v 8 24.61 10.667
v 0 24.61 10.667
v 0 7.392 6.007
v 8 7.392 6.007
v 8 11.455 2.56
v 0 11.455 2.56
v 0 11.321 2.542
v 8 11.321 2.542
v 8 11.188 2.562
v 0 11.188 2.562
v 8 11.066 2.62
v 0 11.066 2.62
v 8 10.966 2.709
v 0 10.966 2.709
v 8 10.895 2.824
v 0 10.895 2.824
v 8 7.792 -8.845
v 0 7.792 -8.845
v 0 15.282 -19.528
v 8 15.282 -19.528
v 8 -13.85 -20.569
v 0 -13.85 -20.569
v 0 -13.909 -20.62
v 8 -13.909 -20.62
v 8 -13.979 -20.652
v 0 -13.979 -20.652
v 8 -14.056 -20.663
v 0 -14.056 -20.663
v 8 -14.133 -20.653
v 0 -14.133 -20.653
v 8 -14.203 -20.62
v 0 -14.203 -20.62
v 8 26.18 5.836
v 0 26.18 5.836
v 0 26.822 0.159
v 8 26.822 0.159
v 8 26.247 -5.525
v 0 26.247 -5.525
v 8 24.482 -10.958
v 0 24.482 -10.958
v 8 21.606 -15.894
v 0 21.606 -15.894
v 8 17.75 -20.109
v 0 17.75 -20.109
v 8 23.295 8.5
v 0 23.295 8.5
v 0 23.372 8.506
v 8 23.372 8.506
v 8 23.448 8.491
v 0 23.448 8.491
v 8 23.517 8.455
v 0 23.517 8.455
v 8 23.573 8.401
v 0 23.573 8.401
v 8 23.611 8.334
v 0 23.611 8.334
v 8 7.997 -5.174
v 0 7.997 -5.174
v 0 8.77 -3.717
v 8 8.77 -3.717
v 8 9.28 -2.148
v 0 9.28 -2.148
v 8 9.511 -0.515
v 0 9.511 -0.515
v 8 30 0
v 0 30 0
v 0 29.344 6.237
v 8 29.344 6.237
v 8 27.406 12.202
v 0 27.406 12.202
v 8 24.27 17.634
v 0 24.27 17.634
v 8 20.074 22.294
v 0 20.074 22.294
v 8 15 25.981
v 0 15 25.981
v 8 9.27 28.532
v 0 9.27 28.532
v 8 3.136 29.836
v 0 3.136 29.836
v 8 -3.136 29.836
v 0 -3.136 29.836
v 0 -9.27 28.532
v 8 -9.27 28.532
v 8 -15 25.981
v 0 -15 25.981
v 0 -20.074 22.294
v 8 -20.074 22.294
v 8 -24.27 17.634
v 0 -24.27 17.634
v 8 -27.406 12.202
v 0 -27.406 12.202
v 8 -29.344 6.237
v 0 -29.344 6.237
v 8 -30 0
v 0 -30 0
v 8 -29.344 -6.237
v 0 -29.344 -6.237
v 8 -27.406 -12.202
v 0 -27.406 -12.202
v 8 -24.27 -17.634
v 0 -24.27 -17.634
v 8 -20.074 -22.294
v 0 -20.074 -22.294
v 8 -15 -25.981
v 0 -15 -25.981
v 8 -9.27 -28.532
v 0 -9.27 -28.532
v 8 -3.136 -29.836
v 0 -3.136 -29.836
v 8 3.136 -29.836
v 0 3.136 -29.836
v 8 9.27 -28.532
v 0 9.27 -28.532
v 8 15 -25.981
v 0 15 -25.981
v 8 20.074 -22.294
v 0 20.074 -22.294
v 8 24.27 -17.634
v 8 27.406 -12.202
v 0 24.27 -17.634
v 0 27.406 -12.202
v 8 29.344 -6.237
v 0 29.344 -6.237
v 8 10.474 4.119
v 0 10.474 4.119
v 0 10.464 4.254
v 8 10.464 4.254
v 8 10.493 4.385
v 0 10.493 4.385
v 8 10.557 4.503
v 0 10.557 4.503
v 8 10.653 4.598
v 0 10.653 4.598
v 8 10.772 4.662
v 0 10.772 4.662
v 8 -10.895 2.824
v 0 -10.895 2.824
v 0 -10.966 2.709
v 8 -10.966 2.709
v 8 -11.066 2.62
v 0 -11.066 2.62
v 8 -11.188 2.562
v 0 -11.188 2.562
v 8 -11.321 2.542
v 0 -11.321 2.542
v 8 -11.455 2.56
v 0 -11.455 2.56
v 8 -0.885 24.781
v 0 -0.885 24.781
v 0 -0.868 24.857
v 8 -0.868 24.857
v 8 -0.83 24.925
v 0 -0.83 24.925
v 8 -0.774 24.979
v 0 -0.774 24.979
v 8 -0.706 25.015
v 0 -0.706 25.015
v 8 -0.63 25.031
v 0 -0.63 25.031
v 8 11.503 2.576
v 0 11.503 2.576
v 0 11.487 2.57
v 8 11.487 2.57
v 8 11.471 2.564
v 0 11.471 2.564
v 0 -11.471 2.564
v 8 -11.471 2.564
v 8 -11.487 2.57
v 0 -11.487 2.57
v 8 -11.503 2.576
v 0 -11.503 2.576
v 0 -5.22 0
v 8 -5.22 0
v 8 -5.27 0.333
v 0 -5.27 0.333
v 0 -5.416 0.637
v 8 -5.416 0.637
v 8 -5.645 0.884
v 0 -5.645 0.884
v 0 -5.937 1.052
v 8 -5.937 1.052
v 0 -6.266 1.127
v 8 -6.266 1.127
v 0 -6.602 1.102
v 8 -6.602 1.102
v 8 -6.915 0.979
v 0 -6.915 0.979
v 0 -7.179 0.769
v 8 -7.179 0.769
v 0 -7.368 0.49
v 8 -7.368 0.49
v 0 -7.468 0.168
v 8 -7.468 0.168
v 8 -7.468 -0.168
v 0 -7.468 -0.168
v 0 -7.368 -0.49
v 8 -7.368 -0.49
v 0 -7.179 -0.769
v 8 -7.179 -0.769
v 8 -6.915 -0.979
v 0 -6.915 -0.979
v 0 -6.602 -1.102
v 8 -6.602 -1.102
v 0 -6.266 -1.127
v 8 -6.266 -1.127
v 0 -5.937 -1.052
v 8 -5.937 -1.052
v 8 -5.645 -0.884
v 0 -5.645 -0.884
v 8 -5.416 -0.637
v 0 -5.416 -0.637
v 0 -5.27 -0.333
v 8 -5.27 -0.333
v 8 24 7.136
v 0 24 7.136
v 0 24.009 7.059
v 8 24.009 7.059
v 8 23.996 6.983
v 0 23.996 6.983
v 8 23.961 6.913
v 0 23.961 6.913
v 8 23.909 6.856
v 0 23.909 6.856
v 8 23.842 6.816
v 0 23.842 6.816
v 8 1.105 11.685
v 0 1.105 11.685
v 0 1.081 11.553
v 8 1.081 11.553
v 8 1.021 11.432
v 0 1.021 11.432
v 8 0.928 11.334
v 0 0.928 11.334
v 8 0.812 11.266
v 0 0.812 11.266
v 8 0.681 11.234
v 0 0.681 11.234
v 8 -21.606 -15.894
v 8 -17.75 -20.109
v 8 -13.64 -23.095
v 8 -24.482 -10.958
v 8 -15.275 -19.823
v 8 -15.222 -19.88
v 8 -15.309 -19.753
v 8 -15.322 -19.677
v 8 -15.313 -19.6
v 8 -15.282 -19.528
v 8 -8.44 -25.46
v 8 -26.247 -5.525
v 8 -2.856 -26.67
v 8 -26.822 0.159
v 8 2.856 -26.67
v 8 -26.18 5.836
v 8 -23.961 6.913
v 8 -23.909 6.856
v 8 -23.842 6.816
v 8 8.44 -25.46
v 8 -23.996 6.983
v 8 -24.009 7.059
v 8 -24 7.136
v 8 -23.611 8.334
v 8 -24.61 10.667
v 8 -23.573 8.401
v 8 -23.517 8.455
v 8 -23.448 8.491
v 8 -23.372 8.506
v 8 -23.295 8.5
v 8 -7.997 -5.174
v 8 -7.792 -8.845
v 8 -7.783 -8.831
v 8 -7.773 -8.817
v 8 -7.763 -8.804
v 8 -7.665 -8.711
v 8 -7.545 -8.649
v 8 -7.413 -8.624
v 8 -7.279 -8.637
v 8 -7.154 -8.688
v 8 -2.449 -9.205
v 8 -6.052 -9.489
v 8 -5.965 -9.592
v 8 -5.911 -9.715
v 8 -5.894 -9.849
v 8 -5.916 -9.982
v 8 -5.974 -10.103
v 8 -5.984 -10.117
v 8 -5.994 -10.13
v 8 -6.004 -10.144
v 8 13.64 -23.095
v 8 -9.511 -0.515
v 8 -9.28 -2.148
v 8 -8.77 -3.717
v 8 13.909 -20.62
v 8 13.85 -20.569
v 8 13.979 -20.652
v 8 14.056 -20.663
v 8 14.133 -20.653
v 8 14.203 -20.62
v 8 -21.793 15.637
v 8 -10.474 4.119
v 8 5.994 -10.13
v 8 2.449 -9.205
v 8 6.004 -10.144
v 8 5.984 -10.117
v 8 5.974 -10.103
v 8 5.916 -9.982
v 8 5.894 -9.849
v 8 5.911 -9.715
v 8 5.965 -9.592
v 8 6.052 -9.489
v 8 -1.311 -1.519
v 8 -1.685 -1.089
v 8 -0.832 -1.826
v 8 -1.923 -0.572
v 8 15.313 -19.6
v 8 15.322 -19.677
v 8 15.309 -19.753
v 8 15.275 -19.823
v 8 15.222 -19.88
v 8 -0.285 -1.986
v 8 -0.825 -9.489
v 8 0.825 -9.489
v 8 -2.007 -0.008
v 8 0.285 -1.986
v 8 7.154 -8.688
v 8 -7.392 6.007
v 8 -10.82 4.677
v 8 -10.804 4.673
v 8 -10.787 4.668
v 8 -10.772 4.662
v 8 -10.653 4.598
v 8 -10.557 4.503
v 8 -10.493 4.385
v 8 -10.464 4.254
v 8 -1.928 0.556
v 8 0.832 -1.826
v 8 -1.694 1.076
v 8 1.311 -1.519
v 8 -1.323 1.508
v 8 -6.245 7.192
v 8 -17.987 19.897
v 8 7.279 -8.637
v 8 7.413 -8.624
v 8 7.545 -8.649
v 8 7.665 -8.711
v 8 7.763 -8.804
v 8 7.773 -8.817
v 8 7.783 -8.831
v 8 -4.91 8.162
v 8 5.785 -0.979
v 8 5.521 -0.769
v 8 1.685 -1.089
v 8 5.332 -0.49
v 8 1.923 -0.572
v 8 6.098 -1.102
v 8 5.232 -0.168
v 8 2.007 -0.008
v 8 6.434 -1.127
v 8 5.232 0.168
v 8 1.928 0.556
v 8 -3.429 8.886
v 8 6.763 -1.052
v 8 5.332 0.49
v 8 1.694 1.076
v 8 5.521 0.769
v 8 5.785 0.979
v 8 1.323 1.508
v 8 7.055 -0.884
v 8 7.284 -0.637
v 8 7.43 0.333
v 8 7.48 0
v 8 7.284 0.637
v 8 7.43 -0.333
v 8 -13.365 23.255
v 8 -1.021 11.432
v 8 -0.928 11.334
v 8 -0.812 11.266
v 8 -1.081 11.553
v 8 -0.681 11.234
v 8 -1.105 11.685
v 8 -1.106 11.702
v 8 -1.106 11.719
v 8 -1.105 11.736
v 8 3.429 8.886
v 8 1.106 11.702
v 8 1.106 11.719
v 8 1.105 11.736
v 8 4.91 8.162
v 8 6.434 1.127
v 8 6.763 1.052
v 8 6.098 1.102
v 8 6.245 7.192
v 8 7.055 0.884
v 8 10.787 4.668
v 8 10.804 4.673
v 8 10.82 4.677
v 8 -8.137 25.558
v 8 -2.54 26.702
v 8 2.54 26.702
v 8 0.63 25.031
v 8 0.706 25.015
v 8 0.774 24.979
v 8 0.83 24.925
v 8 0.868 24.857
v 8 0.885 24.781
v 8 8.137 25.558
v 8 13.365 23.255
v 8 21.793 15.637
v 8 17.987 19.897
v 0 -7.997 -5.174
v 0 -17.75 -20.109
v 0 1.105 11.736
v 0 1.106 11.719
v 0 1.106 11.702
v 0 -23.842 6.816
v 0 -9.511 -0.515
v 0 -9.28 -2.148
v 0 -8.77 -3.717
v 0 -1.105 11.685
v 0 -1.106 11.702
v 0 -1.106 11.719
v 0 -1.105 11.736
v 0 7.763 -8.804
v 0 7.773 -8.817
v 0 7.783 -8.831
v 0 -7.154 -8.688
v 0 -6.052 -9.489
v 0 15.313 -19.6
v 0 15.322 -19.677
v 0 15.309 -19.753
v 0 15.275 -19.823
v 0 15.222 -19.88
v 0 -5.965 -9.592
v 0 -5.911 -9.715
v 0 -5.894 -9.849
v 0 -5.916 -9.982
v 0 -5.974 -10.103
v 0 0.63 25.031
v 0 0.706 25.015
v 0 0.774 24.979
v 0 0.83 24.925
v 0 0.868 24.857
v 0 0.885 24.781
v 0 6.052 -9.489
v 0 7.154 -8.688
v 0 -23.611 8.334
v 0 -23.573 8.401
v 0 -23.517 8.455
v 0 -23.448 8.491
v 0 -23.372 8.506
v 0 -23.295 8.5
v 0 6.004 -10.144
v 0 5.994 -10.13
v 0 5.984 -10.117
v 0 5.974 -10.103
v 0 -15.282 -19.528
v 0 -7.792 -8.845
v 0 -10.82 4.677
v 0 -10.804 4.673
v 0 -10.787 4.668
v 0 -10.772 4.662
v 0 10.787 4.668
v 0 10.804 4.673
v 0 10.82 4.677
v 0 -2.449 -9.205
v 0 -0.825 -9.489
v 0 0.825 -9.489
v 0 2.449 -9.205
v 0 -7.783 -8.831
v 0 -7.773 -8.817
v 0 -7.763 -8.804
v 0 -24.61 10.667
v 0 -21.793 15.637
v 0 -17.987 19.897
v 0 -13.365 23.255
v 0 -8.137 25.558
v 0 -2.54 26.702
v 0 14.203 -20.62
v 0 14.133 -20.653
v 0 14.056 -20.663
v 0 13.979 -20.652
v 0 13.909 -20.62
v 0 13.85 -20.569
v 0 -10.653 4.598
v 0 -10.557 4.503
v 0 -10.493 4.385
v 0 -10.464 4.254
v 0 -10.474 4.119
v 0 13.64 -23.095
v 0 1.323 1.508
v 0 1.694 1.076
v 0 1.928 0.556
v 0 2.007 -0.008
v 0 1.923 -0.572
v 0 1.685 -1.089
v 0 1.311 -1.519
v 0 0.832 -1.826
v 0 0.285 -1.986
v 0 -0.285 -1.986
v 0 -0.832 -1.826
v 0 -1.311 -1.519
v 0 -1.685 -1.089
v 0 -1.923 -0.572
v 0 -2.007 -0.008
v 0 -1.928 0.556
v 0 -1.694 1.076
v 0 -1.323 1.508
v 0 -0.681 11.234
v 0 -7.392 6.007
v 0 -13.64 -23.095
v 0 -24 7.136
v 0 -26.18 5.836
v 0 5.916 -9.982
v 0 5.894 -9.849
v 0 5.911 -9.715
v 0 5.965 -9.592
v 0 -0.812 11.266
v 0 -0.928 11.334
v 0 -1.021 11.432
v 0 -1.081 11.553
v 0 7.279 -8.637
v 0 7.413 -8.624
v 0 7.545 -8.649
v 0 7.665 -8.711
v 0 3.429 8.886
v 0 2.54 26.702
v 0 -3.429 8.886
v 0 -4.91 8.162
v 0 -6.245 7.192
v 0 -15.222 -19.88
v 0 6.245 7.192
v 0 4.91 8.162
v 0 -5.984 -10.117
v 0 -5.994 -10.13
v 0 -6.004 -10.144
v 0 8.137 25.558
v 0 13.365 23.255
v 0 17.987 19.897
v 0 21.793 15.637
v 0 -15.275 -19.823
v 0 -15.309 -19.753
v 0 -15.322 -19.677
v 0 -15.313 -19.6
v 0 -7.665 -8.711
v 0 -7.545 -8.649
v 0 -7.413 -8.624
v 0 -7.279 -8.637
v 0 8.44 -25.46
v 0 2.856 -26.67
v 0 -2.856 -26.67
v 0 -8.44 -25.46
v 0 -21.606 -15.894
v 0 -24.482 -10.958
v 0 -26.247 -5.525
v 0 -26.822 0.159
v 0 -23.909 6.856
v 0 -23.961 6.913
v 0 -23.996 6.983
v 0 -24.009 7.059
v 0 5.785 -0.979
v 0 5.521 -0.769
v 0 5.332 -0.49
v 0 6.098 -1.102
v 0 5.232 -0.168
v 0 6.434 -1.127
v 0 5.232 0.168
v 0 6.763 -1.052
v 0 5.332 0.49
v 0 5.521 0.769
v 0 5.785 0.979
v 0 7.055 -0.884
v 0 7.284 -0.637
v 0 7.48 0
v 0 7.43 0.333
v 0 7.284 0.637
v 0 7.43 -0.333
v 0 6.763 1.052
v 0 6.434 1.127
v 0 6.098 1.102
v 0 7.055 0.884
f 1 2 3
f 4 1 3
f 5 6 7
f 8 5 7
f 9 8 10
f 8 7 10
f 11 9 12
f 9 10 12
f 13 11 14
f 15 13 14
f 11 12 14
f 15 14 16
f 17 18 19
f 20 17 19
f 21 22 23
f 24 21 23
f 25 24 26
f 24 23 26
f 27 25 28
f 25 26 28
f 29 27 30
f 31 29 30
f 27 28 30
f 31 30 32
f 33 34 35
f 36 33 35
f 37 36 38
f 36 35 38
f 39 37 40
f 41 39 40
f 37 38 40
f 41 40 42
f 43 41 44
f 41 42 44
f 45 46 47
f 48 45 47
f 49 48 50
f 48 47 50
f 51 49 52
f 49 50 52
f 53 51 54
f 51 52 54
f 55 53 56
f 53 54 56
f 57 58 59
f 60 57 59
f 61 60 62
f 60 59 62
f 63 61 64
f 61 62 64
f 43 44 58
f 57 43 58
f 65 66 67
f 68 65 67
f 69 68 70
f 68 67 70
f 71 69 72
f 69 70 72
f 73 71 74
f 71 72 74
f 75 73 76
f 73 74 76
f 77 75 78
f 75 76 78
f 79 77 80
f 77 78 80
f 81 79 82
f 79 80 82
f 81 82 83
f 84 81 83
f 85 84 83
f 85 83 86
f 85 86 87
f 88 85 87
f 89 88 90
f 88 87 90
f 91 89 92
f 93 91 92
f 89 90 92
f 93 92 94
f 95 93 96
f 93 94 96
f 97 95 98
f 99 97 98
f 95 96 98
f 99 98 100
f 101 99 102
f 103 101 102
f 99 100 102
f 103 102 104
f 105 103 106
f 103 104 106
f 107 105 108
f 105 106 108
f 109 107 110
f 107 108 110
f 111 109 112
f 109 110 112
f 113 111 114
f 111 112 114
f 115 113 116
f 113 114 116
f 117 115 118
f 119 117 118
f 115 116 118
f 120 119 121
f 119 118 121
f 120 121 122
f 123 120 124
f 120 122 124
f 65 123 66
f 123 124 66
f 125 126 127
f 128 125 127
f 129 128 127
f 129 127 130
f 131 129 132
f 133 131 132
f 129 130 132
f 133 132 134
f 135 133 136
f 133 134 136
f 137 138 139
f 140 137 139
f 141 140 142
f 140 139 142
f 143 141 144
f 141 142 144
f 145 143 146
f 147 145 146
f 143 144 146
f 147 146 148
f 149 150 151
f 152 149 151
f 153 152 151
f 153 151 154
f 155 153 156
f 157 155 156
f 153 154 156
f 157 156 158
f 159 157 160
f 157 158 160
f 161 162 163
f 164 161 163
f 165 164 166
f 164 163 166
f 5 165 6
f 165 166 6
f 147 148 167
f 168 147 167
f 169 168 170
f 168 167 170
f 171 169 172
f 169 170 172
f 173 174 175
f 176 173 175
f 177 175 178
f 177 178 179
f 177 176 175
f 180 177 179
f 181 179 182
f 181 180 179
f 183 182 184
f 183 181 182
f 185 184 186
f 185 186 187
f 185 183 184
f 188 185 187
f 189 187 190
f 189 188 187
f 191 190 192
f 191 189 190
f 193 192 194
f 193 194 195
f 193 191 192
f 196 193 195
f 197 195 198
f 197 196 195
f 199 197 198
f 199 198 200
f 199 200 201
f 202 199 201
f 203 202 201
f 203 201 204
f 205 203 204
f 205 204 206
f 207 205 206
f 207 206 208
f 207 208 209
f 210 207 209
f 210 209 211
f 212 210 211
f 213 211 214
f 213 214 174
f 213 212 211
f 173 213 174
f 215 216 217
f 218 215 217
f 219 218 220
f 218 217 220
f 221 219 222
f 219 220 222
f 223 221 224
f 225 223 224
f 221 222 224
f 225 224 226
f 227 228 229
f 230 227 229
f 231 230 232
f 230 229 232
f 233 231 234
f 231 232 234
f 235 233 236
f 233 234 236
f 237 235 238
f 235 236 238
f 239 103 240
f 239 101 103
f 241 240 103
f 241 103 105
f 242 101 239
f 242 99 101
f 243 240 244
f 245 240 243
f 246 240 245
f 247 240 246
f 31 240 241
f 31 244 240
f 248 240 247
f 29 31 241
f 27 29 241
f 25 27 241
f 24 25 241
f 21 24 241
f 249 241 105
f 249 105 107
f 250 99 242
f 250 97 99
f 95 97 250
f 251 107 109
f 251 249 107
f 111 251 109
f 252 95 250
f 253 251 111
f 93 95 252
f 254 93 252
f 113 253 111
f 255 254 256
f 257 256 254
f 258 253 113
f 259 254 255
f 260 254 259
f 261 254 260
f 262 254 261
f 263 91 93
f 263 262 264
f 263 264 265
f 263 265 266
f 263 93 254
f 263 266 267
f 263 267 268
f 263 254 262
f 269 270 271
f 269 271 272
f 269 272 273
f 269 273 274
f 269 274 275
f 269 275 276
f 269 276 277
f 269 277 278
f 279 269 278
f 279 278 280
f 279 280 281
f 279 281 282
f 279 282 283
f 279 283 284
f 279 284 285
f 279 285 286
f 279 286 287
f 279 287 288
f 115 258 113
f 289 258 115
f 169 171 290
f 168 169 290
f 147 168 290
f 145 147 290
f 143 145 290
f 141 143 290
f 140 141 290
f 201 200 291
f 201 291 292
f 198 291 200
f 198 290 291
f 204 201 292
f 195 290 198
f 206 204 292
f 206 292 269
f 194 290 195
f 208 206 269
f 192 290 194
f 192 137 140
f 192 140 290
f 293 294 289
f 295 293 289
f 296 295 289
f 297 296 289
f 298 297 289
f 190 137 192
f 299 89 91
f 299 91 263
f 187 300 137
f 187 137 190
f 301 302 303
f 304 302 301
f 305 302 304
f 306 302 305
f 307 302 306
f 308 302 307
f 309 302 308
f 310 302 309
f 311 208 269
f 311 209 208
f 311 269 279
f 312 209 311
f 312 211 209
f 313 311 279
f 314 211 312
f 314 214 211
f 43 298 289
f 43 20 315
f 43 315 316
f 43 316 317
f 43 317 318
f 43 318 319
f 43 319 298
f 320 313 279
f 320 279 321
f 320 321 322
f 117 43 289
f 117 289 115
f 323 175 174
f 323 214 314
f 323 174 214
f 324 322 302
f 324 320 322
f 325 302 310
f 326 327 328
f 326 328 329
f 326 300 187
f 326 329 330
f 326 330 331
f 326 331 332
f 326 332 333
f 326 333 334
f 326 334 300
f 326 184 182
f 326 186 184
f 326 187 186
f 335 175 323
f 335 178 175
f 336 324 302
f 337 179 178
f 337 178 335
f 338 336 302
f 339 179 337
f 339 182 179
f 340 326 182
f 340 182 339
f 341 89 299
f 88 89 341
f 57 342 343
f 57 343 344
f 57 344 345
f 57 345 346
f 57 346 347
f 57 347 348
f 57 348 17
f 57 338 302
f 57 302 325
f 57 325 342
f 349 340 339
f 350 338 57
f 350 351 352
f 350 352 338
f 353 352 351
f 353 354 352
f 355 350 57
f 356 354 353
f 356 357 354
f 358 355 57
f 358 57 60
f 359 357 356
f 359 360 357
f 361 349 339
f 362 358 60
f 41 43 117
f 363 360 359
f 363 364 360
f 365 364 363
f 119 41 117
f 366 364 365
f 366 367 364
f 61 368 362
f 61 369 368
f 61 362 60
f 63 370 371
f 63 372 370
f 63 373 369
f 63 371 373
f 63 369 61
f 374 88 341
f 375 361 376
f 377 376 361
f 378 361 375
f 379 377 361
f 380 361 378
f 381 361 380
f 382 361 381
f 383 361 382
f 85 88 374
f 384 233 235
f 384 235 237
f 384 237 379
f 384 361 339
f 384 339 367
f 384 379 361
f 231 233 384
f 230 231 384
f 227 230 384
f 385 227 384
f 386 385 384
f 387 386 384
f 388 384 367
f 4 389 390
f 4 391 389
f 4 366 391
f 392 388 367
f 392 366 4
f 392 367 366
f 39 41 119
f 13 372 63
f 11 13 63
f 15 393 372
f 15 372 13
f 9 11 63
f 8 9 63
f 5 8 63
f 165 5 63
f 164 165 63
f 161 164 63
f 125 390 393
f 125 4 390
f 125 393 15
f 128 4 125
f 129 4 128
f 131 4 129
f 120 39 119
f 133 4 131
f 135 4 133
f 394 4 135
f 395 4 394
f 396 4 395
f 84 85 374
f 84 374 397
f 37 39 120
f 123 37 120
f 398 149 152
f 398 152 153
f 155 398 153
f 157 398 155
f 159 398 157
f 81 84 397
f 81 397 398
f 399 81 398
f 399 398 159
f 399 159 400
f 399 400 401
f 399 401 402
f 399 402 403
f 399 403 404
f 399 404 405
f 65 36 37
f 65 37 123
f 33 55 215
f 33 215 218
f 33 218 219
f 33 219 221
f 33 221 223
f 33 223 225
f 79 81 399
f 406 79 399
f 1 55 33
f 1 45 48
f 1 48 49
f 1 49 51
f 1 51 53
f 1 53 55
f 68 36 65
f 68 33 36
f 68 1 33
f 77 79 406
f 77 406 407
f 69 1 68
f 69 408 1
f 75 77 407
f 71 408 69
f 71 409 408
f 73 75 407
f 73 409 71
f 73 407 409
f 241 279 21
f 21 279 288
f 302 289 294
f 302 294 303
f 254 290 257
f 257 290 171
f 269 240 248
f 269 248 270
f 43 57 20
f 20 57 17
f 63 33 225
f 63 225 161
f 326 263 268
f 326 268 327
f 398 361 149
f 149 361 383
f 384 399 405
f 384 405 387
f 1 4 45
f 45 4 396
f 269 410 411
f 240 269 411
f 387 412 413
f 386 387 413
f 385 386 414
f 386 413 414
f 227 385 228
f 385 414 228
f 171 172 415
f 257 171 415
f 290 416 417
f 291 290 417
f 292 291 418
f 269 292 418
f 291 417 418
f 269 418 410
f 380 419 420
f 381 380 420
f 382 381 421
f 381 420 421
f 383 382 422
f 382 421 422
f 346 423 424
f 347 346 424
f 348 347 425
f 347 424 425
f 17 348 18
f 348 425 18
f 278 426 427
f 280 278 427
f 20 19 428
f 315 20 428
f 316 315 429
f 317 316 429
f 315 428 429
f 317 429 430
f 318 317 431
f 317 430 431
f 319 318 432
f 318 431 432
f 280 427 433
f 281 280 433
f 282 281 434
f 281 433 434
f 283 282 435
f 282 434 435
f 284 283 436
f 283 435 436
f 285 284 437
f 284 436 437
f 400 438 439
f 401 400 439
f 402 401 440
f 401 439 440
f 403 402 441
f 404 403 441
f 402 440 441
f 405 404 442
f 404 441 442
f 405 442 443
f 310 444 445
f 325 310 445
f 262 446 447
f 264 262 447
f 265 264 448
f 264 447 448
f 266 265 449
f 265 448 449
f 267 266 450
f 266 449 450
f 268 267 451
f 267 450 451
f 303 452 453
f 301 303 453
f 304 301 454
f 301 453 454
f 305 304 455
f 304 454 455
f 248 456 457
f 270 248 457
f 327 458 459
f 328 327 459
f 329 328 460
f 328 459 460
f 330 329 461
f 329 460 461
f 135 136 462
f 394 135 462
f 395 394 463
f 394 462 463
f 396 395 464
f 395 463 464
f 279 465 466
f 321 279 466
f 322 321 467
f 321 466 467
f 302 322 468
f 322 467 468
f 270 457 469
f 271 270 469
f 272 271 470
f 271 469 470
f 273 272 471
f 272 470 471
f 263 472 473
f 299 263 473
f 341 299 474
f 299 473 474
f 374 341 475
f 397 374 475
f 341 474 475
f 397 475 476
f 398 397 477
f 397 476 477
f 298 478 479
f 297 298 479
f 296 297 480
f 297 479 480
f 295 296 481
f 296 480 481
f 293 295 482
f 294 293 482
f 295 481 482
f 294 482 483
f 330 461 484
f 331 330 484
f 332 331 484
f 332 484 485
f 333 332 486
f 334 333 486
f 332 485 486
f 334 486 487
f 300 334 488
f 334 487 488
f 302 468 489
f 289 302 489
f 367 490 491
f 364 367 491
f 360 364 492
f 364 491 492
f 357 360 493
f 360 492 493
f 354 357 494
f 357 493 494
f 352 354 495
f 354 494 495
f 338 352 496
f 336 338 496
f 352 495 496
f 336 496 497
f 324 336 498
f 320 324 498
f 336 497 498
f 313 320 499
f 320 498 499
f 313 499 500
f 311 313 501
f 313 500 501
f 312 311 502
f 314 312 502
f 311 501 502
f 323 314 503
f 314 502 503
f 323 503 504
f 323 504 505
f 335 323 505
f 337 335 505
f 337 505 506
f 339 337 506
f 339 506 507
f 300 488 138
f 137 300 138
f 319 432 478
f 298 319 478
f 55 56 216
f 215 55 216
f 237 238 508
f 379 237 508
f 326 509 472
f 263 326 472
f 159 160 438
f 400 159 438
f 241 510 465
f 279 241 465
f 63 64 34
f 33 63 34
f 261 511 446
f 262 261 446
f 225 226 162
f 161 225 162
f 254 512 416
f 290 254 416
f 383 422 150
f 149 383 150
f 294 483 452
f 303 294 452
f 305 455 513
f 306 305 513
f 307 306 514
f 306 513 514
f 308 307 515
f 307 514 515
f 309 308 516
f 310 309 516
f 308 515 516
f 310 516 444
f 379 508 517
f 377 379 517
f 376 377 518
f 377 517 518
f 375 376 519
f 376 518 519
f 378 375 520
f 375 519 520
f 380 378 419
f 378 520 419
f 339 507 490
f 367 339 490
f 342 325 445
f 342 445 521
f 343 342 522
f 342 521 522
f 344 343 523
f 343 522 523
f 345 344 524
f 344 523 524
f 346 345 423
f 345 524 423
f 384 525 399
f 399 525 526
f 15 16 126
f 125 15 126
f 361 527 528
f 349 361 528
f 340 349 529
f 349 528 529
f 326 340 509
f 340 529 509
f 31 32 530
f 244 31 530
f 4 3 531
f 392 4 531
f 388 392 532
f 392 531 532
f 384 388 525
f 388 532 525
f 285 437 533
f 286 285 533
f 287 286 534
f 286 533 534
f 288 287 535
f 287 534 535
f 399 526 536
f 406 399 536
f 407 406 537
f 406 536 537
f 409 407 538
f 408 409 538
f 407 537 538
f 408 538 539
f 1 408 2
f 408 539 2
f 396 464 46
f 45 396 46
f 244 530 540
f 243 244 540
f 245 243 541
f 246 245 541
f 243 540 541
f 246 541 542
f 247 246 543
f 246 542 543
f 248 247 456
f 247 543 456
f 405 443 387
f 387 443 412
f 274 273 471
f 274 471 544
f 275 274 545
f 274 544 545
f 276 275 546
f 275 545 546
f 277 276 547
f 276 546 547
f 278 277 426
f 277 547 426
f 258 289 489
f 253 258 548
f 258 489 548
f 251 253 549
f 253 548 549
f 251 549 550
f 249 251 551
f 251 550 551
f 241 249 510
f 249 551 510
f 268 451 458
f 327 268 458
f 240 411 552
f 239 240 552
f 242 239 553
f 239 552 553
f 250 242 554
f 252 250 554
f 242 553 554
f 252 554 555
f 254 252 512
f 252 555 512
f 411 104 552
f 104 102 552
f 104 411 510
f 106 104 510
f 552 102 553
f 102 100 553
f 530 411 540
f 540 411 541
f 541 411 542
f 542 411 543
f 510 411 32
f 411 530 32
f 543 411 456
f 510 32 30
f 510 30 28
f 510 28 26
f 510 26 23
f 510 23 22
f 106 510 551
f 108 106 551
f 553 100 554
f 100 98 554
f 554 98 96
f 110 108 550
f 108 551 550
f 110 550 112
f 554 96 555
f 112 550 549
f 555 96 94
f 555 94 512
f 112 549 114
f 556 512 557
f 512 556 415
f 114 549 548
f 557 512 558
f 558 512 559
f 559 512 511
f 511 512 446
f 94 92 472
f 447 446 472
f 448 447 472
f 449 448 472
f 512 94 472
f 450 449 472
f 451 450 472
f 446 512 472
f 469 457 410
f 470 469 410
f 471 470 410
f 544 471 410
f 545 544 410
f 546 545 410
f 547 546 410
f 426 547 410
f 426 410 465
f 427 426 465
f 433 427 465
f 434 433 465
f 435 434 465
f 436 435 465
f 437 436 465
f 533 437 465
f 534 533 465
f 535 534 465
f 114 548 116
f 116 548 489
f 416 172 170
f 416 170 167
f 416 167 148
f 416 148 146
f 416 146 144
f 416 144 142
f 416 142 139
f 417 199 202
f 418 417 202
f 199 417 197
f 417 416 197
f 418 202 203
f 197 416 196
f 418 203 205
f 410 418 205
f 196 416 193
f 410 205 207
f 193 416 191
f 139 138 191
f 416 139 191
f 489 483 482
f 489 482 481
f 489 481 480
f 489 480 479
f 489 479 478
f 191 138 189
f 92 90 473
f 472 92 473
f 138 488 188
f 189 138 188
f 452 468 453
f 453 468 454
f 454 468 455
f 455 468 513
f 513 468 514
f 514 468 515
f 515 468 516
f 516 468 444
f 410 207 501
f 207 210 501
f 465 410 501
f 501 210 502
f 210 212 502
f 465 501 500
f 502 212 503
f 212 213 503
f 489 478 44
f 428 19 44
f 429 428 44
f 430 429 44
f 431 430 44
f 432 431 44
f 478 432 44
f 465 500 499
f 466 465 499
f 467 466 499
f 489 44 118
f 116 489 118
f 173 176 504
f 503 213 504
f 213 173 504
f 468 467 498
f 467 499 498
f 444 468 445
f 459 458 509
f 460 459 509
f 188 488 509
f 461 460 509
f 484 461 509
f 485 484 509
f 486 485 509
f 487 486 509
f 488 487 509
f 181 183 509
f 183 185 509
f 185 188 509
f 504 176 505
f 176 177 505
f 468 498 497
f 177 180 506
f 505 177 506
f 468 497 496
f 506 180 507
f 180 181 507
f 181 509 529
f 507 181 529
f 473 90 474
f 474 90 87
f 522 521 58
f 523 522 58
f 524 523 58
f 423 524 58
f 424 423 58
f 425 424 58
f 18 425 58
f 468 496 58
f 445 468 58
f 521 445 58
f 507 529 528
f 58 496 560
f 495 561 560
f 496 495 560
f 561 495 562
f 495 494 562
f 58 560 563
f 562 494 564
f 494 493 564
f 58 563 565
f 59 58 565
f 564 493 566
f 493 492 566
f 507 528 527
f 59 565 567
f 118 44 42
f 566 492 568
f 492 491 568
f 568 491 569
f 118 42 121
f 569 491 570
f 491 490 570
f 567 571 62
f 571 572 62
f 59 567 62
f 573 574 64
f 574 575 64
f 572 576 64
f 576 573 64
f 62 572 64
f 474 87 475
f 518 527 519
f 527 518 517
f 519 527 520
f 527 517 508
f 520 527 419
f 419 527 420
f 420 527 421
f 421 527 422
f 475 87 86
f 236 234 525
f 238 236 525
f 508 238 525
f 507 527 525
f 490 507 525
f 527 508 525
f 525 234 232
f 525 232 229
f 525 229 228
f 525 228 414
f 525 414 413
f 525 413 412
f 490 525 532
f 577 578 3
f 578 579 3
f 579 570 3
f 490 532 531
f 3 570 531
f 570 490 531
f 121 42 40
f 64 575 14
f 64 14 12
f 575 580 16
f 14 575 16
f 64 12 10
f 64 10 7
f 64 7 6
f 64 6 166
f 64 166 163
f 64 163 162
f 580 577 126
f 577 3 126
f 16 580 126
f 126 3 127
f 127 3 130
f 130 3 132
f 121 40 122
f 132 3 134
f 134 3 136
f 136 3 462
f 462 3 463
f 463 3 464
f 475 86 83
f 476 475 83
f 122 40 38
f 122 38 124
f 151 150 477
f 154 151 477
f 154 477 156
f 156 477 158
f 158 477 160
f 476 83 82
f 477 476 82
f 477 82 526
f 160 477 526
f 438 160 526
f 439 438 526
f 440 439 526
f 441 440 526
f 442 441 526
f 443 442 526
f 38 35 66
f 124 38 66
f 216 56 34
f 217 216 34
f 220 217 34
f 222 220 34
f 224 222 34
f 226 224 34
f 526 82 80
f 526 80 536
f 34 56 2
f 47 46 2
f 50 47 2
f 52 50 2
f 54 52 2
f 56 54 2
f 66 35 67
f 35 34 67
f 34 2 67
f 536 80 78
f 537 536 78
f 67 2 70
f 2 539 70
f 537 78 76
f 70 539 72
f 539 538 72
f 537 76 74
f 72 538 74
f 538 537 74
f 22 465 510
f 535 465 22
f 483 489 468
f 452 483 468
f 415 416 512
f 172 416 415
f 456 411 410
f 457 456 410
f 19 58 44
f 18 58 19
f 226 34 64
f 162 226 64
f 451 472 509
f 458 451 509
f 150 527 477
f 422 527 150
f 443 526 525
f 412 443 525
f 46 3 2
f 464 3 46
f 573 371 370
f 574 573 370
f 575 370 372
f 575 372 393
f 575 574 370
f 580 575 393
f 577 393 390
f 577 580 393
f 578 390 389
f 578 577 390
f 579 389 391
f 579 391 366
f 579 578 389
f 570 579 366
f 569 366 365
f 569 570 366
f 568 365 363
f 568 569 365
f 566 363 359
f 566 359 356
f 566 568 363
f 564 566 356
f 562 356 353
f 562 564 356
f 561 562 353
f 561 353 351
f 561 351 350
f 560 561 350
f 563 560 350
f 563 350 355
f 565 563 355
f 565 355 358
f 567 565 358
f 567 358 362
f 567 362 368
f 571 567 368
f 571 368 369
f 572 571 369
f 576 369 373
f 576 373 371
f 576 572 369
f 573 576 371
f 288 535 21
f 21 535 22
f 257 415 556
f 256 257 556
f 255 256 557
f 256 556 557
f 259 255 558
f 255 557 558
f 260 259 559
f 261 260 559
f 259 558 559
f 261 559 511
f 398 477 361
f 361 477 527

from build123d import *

# Parameters (mm, degrees)
F0_R     = 29.99994
F0_R_2   = 1.1303
F1_DEPTH = 8.000009


with BuildPart() as f1:
    # F0 (on Right) → F1 (new body)
    with BuildSketch(Plane.YZ):
        Circle(F0_R)
        with BuildLine():
            Line((-13.640059, -23.095236), (-2.449158, -9.204741))
            ThreePointArc((-2.449158, -9.204741), (0, -9.525), (2.449158, -9.204741))
            Line((2.449158, -9.204741), (13.640059, -23.095236))
            ThreePointArc((13.640059, -23.095236), (0, -26.8224), (-13.640059, -23.095236))
        make_face(mode=Mode.SUBTRACT)
        with BuildLine():
            Line((-26.179885, 5.835646), (-9.51106, -0.515133))
            ThreePointArc((-9.51106, -0.515133), (-9.058813, -2.943387), (-7.997397, -5.173709))
            Line((-7.997397, -5.173709), (-17.749865, -20.109287))
            ThreePointArc((-17.749865, -20.109287), (-25.509618, -8.288577), (-26.179885, 5.835646))
        make_face(mode=Mode.SUBTRACT)
        with BuildLine():
            ThreePointArc((-6.05216, -9.489048), (-5.897812, -9.781454), (-5.973962, -10.103209))
            ThreePointArc((-5.973962, -10.103209), (-5.98861, -10.123802), (-6.004343, -10.143579))
            Line((-6.004343, -10.143579), (-13.850079, -20.568703))
            ThreePointArc((-13.850079, -20.568703), (-14.017097, -20.66058), (-14.203454, -20.620481))
            Line((-14.203454, -20.620481), (-15.222134, -19.880366))
            ThreePointArc((-15.222134, -19.880366), (-15.317858, -19.715522), (-15.282089, -19.528287))
            Line((-15.282089, -19.528287), (-7.791673, -8.845008))
            ThreePointArc((-7.791673, -8.845008), (-7.777726, -8.823934), (-7.762667, -8.803639))
            ThreePointArc((-7.762667, -8.803639), (-7.480192, -8.631788), (-7.1544, -8.688223))
            Line((-7.1544, -8.688223), (-6.05216, -9.489048))
        make_face(mode=Mode.SUBTRACT)
        with BuildLine():
            ThreePointArc((7.1544, -8.688223), (7.480192, -8.631788), (7.762667, -8.803639))
            ThreePointArc((7.762667, -8.803639), (7.777726, -8.823934), (7.791673, -8.845008))
            Line((7.791673, -8.845008), (15.282089, -19.528287))
            ThreePointArc((15.282089, -19.528287), (15.317858, -19.715522), (15.222134, -19.880366))
            Line((15.222134, -19.880366), (14.203454, -20.620481))
            ThreePointArc((14.203454, -20.620481), (14.017097, -20.66058), (13.850079, -20.568703))
            Line((13.850079, -20.568703), (6.004343, -10.143579))
            ThreePointArc((6.004343, -10.143579), (5.98861, -10.123802), (5.973962, -10.103209))
            ThreePointArc((5.973962, -10.103209), (5.897812, -9.781454), (6.05216, -9.489048))
            Line((6.05216, -9.489048), (7.1544, -8.688223))
        make_face(mode=Mode.SUBTRACT)
        with BuildLine():
            ThreePointArc((1.32334, 1.508382), (0, -2.0066), (-1.32334, 1.508382))
            Line((-1.32334, 1.508382), (1.32334, 1.508382))
        make_face(mode=Mode.SUBTRACT)
        with BuildLine():
            Line((17.749865, -20.109287), (7.997397, -5.173709))
            ThreePointArc((7.997397, -5.173709), (9.058813, -2.943387), (9.51106, -0.515133))
            Line((9.51106, -0.515133), (26.179885, 5.835646))
            ThreePointArc((26.179885, 5.835646), (25.509618, -8.288577), (17.749865, -20.109287))
        make_face(mode=Mode.SUBTRACT)
        with BuildLine():
            ThreePointArc((-10.894841, 2.823669), (-11.12524, 2.586517), (-11.454779, 2.559512))
            ThreePointArc((-11.454779, 2.559512), (-11.478891, 2.56708), (-11.502561, 2.575932))
            Line((-11.502561, 2.575932), (-23.841909, 6.816129))
            ThreePointArc((-23.841909, 6.816129), (-23.980901, 6.946581), (-24.000351, 7.136208))
            Line((-24.000351, 7.136208), (-23.61125, 8.333739))
            ThreePointArc((-23.61125, 8.333739), (-23.484054, 8.475717), (-23.294929, 8.499558))
            Line((-23.294929, 8.499558), (-10.819862, 4.677063))
            ThreePointArc((-10.819862, 4.677063), (-10.795509, 4.670311), (-10.771554, 4.662261))
            ThreePointArc((-10.771554, 4.662261), (-10.520825, 4.446716), (-10.473823, 4.11943))
            Line((-10.473823, 4.11943), (-10.894841, 2.823669))
        make_face(mode=Mode.SUBTRACT)
        with Locations((-6.35, 0)):
            Circle(F0_R_2, mode=Mode.SUBTRACT)
        with BuildLine():
            ThreePointArc((-24.610079, 10.667013), (-15.765811, 21.699777), (-2.54, 26.701864))
            Line((-2.54, 26.701864), (-3.429, 8.886371))
            ThreePointArc((-3.429, 8.886371), (-5.598655, 7.705887), (-7.391821, 6.007212))
            Line((-7.391821, 6.007212), (-24.610079, 10.667013))
        make_face(mode=Mode.SUBTRACT)
        with Locations((6.35, 0)):
            Circle(F0_R_2, mode=Mode.SUBTRACT)
        with BuildLine():
            ThreePointArc((10.473823, 4.11943), (10.520825, 4.446716), (10.771554, 4.662261))
            ThreePointArc((10.771554, 4.662261), (10.795509, 4.670311), (10.819862, 4.677063))
            Line((10.819862, 4.677063), (23.294929, 8.499558))
            ThreePointArc((23.294929, 8.499558), (23.484054, 8.475717), (23.61125, 8.333739))
            Line((23.61125, 8.333739), (24.000351, 7.136208))
            ThreePointArc((24.000351, 7.136208), (23.980901, 6.946581), (23.841909, 6.816129))
            Line((23.841909, 6.816129), (11.502561, 2.575932))
            ThreePointArc((11.502561, 2.575932), (11.478891, 2.56708), (11.454779, 2.559512))
            ThreePointArc((11.454779, 2.559512), (11.12524, 2.586517), (10.894841, 2.823669))
            Line((10.894841, 2.823669), (10.473823, 4.11943))
        make_face(mode=Mode.SUBTRACT)
        with BuildLine():
            Line((0.681222, 11.234171), (-0.681222, 11.234171))
            ThreePointArc((-0.681222, 11.234171), (-0.977964, 11.38001), (-1.105481, 11.685075))
            ThreePointArc((-1.105481, 11.685075), (-1.105734, 11.710345), (-1.10463, 11.735592))
            Line((-1.10463, 11.735592), (-0.885031, 24.781302))
            ThreePointArc((-0.885031, 24.781302), (-0.803914, 24.953804), (-0.629579, 25.0309))
            Line((-0.629579, 25.0309), (0.629579, 25.0309))
            ThreePointArc((0.629579, 25.0309), (0.803914, 24.953804), (0.885031, 24.781302))
            Line((0.885031, 24.781302), (1.10463, 11.735592))
            ThreePointArc((1.10463, 11.735592), (1.105734, 11.710345), (1.105481, 11.685075))
            ThreePointArc((1.105481, 11.685075), (0.977964, 11.38001), (0.681222, 11.234171))
        make_face(mode=Mode.SUBTRACT)
        with BuildLine():
            Line((3.429, 8.886371), (2.54, 26.701864))
            ThreePointArc((2.54, 26.701864), (15.765811, 21.699777), (24.610079, 10.667013))
            Line((24.610079, 10.667013), (7.391821, 6.007212))
            ThreePointArc((7.391821, 6.007212), (5.598655, 7.705887), (3.429, 8.886371))
        make_face(mode=Mode.SUBTRACT)
    extrude(amount=F1_DEPTH)


solid = f1.part
